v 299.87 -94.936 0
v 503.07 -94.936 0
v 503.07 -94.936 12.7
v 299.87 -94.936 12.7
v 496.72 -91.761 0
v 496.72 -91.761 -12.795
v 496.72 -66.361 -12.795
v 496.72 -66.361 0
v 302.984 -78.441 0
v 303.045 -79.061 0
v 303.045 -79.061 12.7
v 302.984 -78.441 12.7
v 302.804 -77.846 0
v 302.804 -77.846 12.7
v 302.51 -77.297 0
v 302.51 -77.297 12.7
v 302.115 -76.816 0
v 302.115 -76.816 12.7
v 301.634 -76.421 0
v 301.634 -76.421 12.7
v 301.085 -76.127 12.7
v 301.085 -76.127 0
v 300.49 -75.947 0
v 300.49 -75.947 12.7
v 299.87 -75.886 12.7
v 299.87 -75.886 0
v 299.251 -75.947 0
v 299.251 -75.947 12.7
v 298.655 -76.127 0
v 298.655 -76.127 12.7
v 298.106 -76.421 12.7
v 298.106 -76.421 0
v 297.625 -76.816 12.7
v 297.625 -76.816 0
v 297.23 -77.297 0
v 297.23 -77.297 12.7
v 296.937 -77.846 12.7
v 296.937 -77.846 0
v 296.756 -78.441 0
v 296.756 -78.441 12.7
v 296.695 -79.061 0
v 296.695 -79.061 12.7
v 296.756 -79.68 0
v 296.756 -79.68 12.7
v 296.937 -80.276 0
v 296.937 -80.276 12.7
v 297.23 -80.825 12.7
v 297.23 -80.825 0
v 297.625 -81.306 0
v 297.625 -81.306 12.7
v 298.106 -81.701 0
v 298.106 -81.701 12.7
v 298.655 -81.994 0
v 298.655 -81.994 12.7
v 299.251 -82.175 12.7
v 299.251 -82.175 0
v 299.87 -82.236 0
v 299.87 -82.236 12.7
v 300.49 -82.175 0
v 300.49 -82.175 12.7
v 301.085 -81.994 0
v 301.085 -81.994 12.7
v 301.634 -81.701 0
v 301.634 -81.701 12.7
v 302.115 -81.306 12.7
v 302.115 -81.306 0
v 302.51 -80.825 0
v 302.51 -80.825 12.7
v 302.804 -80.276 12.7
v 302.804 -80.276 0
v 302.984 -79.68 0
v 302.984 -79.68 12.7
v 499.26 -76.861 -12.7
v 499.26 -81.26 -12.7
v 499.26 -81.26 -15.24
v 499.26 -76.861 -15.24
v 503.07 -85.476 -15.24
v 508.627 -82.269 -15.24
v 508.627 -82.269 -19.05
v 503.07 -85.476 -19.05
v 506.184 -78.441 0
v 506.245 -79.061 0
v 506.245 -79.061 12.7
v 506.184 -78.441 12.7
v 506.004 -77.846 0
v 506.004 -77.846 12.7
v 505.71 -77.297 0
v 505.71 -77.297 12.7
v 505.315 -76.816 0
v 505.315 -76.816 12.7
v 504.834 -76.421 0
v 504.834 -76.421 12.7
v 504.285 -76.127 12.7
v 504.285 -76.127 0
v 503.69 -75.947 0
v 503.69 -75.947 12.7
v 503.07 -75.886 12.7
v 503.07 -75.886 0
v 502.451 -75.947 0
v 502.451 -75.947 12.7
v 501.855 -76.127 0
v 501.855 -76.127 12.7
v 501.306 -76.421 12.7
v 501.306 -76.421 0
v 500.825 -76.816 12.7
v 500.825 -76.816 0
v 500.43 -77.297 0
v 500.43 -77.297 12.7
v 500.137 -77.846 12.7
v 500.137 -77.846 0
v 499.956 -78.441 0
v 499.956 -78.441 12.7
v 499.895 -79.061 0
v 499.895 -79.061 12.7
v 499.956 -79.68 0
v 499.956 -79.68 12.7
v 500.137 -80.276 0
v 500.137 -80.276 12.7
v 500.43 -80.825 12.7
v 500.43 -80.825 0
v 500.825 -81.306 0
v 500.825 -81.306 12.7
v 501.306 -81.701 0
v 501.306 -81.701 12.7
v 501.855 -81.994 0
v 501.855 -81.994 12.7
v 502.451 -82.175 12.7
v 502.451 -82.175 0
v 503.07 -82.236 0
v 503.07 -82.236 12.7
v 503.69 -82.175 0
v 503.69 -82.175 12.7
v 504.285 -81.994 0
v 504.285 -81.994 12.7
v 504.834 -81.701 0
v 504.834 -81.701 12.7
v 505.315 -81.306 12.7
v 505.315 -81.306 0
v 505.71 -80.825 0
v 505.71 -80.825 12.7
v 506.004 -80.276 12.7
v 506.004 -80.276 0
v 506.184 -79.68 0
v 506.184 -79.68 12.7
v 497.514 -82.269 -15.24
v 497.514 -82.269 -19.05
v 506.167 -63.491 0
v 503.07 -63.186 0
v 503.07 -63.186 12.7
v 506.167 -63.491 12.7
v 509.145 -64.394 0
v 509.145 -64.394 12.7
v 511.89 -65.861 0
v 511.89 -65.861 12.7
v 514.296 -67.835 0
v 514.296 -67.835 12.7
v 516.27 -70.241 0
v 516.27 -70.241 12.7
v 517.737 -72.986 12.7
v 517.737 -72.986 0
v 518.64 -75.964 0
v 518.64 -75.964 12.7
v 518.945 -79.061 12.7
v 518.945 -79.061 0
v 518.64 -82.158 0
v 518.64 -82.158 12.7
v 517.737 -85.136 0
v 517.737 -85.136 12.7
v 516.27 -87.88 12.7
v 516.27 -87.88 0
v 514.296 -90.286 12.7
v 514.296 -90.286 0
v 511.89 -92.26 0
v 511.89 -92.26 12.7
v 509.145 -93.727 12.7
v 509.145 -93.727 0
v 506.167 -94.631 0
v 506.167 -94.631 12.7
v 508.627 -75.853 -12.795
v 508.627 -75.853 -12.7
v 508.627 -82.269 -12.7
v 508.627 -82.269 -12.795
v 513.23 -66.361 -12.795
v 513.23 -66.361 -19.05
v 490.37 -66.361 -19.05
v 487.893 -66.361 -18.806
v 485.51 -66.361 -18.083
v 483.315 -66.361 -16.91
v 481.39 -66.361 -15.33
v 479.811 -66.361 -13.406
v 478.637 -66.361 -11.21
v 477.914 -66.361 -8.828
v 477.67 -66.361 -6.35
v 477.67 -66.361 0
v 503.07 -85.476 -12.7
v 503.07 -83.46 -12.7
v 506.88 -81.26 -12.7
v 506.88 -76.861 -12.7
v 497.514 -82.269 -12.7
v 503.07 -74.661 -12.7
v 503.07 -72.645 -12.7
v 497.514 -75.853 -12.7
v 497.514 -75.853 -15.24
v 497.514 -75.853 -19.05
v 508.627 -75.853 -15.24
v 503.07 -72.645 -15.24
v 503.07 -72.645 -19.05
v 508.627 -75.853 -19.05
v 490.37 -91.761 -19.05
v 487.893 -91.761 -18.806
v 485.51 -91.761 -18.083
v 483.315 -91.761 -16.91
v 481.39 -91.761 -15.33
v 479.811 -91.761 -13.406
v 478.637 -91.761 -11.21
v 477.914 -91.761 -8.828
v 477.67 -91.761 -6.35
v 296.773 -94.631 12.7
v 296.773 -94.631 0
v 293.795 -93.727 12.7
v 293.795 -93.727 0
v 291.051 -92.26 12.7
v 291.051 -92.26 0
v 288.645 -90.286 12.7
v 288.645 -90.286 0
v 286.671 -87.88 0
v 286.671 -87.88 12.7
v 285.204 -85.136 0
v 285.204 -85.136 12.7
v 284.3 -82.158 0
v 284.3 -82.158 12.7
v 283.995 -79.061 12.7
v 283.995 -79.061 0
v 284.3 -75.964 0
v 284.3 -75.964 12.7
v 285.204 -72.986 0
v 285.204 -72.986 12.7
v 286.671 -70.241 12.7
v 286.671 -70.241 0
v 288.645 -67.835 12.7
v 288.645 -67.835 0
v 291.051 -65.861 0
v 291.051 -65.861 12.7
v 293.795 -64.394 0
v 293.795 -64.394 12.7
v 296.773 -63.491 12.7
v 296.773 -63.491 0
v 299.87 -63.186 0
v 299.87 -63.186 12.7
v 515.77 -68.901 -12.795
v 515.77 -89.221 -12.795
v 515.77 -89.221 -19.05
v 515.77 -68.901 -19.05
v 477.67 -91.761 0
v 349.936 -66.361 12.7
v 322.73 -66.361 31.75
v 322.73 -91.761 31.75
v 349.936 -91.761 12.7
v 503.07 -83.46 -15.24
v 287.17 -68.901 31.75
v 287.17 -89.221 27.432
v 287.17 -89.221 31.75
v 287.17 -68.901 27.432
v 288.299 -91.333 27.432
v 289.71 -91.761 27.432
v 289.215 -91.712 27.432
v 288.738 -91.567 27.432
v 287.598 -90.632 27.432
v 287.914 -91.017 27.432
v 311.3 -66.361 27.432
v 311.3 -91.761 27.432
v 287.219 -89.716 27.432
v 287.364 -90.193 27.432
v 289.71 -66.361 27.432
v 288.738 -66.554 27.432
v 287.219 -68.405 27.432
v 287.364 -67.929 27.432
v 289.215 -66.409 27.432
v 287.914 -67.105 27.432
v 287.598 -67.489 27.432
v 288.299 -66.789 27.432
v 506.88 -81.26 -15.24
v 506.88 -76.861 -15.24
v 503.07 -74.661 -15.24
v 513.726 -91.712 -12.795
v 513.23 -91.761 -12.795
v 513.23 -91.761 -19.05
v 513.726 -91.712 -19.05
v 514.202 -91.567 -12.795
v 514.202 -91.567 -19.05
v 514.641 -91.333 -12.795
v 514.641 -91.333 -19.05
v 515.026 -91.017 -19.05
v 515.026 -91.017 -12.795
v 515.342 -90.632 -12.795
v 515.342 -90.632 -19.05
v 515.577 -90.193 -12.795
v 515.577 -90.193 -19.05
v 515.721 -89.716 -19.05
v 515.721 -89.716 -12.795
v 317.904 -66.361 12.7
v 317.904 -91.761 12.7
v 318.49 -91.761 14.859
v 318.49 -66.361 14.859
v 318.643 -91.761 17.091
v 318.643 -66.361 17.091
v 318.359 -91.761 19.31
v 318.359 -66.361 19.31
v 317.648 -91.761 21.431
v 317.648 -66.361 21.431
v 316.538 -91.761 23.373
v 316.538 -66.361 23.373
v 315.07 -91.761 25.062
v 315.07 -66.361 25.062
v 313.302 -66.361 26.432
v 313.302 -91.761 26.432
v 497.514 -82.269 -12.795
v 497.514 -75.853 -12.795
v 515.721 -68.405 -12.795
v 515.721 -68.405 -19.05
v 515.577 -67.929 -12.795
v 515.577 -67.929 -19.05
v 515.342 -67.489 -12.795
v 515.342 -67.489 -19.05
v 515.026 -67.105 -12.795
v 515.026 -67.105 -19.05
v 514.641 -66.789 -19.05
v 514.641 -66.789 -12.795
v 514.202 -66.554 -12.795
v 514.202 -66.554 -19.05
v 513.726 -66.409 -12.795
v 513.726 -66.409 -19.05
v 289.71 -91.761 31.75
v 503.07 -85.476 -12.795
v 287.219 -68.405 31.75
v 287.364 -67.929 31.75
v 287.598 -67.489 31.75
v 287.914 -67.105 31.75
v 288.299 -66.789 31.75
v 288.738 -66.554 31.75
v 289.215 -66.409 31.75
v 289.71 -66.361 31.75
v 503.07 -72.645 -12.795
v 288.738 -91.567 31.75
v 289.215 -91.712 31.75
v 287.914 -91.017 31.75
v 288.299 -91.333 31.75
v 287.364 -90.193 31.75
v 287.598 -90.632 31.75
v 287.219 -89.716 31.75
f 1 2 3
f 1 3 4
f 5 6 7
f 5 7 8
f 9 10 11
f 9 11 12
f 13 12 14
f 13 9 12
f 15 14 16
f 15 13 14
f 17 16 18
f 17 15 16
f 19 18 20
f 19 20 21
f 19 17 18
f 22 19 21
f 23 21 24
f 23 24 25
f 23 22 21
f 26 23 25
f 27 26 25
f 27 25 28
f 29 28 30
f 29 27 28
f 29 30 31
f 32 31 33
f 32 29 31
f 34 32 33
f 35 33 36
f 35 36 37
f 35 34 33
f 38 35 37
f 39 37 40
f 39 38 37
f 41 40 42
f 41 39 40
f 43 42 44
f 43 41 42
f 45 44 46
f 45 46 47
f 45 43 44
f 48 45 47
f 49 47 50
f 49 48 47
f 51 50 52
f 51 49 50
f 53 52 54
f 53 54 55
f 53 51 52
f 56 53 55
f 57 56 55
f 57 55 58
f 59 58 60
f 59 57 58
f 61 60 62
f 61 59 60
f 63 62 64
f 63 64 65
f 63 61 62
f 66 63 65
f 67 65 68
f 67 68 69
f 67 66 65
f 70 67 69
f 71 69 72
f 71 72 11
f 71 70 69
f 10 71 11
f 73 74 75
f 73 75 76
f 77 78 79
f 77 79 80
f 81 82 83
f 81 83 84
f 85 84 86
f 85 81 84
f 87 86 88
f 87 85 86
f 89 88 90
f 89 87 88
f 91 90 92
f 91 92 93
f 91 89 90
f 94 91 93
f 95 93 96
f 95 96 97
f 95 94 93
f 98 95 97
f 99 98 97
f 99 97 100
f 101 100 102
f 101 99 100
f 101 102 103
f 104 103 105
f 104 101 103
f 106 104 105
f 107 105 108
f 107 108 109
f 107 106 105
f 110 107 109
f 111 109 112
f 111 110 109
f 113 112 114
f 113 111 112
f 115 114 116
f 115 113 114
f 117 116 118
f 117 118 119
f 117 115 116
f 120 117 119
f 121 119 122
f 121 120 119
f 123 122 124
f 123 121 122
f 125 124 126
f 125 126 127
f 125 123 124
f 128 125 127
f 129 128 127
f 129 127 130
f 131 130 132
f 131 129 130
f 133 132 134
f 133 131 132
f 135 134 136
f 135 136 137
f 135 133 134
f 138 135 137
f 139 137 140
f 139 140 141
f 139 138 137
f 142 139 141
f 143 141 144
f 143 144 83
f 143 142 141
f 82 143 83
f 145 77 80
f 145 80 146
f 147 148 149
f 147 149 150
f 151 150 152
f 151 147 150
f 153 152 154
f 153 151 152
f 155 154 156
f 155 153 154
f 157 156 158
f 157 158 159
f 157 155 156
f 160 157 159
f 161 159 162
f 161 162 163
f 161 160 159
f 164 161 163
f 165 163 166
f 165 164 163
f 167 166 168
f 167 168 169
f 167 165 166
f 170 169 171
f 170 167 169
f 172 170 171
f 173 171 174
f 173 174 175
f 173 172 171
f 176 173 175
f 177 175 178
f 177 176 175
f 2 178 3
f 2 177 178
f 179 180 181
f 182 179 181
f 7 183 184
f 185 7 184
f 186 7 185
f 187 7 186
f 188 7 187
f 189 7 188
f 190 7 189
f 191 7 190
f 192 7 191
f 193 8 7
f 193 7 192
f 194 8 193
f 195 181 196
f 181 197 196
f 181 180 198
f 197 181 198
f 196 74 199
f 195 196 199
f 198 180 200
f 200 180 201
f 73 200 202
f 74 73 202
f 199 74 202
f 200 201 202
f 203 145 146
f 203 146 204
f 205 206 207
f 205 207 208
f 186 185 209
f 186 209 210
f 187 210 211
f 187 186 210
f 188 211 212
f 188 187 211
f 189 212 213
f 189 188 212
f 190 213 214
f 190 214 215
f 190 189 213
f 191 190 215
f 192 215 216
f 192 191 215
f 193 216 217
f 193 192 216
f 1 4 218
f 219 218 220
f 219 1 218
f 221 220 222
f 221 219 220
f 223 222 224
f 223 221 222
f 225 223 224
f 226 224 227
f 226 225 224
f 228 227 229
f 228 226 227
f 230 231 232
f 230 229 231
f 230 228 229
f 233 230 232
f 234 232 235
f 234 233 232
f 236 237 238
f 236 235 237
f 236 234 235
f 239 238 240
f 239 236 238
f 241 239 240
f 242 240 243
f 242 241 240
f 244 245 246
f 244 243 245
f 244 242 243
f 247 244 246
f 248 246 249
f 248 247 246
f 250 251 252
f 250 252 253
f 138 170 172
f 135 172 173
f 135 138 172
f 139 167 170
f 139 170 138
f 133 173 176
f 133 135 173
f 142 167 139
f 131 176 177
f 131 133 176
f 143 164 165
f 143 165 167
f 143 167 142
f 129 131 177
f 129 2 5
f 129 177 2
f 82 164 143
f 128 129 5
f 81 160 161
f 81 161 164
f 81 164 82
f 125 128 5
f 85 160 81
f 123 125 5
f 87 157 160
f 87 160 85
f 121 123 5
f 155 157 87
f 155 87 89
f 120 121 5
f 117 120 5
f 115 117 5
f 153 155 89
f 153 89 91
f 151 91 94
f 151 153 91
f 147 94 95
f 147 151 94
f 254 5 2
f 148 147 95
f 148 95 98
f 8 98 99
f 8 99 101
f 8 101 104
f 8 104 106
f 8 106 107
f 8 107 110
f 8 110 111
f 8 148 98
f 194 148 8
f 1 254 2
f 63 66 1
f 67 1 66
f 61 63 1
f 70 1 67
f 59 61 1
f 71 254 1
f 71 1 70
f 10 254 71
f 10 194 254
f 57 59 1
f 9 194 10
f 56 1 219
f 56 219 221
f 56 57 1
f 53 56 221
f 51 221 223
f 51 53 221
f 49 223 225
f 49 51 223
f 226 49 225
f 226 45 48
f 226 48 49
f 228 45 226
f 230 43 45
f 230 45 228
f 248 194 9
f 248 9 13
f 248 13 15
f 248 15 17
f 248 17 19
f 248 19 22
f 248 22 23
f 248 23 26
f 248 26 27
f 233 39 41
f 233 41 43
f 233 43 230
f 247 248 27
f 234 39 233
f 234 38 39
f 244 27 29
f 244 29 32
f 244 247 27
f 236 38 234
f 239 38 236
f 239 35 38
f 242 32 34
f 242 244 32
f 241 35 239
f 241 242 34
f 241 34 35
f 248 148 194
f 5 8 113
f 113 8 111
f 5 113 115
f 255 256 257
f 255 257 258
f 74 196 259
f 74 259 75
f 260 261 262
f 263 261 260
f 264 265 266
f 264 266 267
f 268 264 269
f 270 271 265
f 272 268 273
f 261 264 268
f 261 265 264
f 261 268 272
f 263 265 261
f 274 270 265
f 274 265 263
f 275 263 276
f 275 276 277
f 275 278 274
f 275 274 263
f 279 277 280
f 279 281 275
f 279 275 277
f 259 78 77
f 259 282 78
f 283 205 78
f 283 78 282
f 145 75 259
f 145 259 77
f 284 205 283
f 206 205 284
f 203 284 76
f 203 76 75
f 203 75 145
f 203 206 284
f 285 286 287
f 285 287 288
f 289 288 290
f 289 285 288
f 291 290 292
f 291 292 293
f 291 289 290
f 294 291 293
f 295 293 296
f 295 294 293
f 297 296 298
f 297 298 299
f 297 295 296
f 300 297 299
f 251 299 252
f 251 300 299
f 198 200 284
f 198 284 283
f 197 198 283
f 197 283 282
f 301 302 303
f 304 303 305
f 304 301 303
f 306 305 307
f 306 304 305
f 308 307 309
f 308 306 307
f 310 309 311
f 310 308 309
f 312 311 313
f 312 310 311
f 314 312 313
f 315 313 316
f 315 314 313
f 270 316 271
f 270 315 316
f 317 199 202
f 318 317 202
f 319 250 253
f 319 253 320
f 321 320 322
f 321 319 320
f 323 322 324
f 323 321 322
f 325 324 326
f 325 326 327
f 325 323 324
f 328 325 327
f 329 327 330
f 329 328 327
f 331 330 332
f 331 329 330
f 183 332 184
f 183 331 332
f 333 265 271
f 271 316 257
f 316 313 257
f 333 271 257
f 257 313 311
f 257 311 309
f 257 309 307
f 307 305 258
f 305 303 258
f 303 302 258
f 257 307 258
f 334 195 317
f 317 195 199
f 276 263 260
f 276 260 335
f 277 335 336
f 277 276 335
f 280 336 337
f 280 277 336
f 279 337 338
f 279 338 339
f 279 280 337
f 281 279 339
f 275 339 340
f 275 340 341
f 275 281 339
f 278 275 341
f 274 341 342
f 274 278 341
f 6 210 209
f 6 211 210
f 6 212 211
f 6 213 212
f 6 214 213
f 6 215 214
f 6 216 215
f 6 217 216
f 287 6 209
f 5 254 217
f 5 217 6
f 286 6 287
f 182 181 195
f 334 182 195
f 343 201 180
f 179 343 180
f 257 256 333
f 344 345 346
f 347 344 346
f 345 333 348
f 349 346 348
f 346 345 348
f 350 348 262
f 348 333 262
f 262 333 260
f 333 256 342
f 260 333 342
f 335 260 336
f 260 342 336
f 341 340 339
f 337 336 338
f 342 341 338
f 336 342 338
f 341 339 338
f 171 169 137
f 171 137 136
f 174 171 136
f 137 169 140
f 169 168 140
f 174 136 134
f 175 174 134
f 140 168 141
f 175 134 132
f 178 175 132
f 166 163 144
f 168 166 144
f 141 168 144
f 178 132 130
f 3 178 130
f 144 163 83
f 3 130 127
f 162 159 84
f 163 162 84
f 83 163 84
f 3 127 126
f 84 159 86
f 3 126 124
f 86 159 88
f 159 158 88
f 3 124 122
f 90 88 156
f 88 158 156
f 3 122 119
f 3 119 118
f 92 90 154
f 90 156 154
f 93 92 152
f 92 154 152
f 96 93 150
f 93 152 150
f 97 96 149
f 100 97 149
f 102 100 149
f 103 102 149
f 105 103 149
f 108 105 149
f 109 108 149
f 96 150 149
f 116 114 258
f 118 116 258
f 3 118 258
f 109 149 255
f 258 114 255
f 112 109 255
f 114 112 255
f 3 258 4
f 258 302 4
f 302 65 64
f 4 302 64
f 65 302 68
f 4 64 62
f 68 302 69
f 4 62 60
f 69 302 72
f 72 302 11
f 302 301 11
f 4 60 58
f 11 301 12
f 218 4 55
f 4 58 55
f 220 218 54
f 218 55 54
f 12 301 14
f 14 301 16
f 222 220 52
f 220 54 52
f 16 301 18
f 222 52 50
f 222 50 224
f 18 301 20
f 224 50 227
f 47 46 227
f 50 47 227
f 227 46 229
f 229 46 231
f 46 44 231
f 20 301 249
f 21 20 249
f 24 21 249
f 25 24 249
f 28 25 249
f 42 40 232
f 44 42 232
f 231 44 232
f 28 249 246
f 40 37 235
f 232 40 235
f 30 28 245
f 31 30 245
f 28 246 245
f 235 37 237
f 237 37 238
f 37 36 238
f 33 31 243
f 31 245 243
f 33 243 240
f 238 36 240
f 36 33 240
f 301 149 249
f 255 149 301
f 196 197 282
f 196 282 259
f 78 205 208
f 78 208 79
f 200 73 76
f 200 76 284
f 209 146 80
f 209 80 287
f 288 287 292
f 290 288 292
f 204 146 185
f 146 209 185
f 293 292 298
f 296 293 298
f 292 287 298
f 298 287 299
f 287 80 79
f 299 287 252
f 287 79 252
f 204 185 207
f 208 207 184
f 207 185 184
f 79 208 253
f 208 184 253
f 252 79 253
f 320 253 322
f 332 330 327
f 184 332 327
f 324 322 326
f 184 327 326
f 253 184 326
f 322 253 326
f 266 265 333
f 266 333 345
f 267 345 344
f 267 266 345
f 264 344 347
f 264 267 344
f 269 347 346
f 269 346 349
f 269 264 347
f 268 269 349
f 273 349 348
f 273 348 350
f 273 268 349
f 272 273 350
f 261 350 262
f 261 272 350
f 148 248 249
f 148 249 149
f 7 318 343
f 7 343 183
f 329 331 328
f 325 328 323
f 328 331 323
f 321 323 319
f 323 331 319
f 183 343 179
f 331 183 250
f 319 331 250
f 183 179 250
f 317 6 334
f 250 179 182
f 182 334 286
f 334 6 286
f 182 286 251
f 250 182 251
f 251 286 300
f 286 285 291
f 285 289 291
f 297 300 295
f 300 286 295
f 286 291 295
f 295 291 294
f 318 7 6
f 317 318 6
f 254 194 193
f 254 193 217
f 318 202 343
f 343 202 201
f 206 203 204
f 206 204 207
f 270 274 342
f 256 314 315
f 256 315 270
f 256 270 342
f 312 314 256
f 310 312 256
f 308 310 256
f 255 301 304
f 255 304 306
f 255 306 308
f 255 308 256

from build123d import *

# Parameters (mm, degrees)
SKETCH1_R            = 3.175
BOSS_EXTRUDE1_DEPTH  = 12.7
BOSS_EXTRUDE8_DEPTH  = 19.05
CUT_EXTRUDE3_DEPTH   = 41.148
BOSS_EXTRUDE9_DEPTH  = 25.4
BOSS_EXTRUDE11_DEPTH = 19.05
SKETCH10_W           = 19.05
SKETCH10_H           = 12.794581221
CUT_EXTRUDE5_DEPTH   = 25.4
BOSS_EXTRUDE12_DEPTH = 2.54
CUT_EXTRUDE6_DEPTH   = 25.4


with BuildPart() as part:
    # Sketch1 → Boss-Extrude1 (new body)
    with BuildSketch(Plane.XY):
        with BuildLine():
            Line((299.870251741, -63.185614448), (503.070251741, -63.185614448))
            ThreePointArc((503.070251741, -63.185614448), (518.945251741, -79.060614448), (503.070251741, -94.935614448))
            Line((503.070251741, -94.935614448), (299.870251741, -94.935614448))
            ThreePointArc((299.870251741, -94.935614448), (283.995251741, -79.060614448), (299.870251741, -63.185614448))
        make_face()
        with Locations((299.870251741, -79.060614448)):
            Circle(SKETCH1_R, mode=Mode.SUBTRACT)
        with Locations((503.070251741, -79.060614448)):
            Circle(SKETCH1_R, mode=Mode.SUBTRACT)
    extrude(amount=BOSS_EXTRUDE1_DEPTH)

    # Sketch7 → Boss-Extrude8 (add)
    with BuildSketch(Plane.XY.offset(12.7)):
        with BuildLine():
            Line((310.030251741, -66.360614448), (312.570251741, -66.360614448))
            Line((312.570251741, -66.360614448), (322.730251741, -66.360614448))
            Line((322.730251741, -66.360614448), (322.730251741, -91.760614448))
            Line((322.730251741, -91.760614448), (310.030251741, -91.760614448))
            Line((310.030251741, -91.760614448), (289.710251741, -91.760614448))
            ThreePointArc((289.710251741, -91.760614448), (287.914200517, -91.016665672), (287.170251741, -89.220614448))
            Line((287.170251741, -89.220614448), (287.170251741, -68.900614448))
            ThreePointArc((287.170251741, -68.900614448), (287.914200517, -67.104563223), (289.710251741, -66.360614448))
            Line((289.710251741, -66.360614448), (310.030251741, -66.360614448))
        make_face()
    extrude(amount=BOSS_EXTRUDE8_DEPTH)

    # Sketch8 → Cut-Extrude3 (cut)
    with BuildSketch(Plane(origin=(0, -66.360614448, 0), x_dir=(1, 0, 0), z_dir=(0, 1, 0))):
        with BuildLine():
            Line((287.170251741, -12.7), (317.904251741, -12.7))
            ThreePointArc((317.904251741, -12.7), (317.648023156, -21.431345807), (311.300251741, -27.432))
            Line((311.300251741, -27.432), (287.170251741, -27.432))
            Line((287.170251741, -27.432), (287.170251741, -12.7))
        make_face()
    extrude(amount=-CUT_EXTRUDE3_DEPTH, mode=Mode.SUBTRACT)

    # Sketch9 → Boss-Extrude9 (add)
    with BuildSketch(Plane(origin=(0, -66.360614448, 0), x_dir=(1, 0, 0), z_dir=(0, 1, 0))):
        Polygon((322.730251741, -31.75), (349.936471269, -12.7), (322.730251741, -12.7), align=None)
    extrude(amount=-BOSS_EXTRUDE9_DEPTH)

    # Sketch2 → Boss-Extrude11 (add)
    with BuildSketch(Plane(origin=(0, 0, 0), x_dir=(-1, 0, 0), z_dir=(0, 0, -1))):
        with BuildLine():
            Line((-477.670251741, -66.360614448), (-477.670251741, -91.760614448))
            Line((-477.670251741, -91.760614448), (-513.230251741, -91.760614448))
            ThreePointArc((-513.230251741, -91.760614448), (-515.026302965, -91.016665672), (-515.770251741, -89.220614448))
            Line((-515.770251741, -89.220614448), (-515.770251741, -68.900614448))
            ThreePointArc((-515.770251741, -68.900614448), (-515.026302965, -67.104563223), (-513.230251741, -66.360614448))
            Line((-513.230251741, -66.360614448), (-477.670251741, -66.360614448))
        make_face()
        Polygon((-503.070251741, -72.644809581), (-508.626501741, -75.852712014), (-508.626501741, -82.268516881), (-503.070251741, -85.476419314), (-497.514001741, -82.268516881), (-497.514001741, -75.852712014), align=None, mode=Mode.SUBTRACT)
    extrude(amount=BOSS_EXTRUDE11_DEPTH)

    # Sketch10 → Cut-Extrude5 (cut)
    with BuildSketch(Plane.XZ.offset(91.760614448)):
        with Locations((506.245251741, -6.397290611)):
            Rectangle(SKETCH10_W, SKETCH10_H)
    extrude(amount=-CUT_EXTRUDE5_DEPTH, mode=Mode.SUBTRACT)

    # Sketch11 → Boss-Extrude12 (add)
    with BuildSketch(Plane(origin=(0, 0, -12.7), x_dir=(-1, 0, 0), z_dir=(0, 0, -1))):
        Polygon((-503.070251741, -72.644809581), (-508.626501741, -75.852712014), (-508.626501741, -82.268516881), (-503.070251741, -85.476419314), (-497.514001741, -82.268516881), (-497.514001741, -75.852712014), align=None)
        Polygon((-503.070251741, -74.661205396), (-506.880251741, -76.860909922), (-506.880251741, -81.260318973), (-503.070251741, -83.460023499), (-499.260251741, -81.260318973), (-499.260251741, -76.860909922), align=None, mode=Mode.SUBTRACT)
    extrude(amount=BOSS_EXTRUDE12_DEPTH)

    # Sketch12 → Cut-Extrude6 (cut)
    with BuildSketch(Plane(origin=(0, -66.360614448, 0), x_dir=(1, 0, 0), z_dir=(0, 1, 0))):
        with BuildLine():
            Line((477.670251741, 6.35), (477.670251741, 9.525))
            Line((477.670251741, 9.525), (477.670251741, 19.05))
            Line((477.670251741, 19.05), (486.490339075, 19.05))
            Line((486.490339075, 19.05), (490.370251741, 19.05))
            ThreePointArc((490.370251741, 19.05), (481.38999562, 15.330256121), (477.670251741, 6.35))
        make_face()
    extrude(amount=-CUT_EXTRUDE6_DEPTH, mode=Mode.SUBTRACT)


solid = part.part
